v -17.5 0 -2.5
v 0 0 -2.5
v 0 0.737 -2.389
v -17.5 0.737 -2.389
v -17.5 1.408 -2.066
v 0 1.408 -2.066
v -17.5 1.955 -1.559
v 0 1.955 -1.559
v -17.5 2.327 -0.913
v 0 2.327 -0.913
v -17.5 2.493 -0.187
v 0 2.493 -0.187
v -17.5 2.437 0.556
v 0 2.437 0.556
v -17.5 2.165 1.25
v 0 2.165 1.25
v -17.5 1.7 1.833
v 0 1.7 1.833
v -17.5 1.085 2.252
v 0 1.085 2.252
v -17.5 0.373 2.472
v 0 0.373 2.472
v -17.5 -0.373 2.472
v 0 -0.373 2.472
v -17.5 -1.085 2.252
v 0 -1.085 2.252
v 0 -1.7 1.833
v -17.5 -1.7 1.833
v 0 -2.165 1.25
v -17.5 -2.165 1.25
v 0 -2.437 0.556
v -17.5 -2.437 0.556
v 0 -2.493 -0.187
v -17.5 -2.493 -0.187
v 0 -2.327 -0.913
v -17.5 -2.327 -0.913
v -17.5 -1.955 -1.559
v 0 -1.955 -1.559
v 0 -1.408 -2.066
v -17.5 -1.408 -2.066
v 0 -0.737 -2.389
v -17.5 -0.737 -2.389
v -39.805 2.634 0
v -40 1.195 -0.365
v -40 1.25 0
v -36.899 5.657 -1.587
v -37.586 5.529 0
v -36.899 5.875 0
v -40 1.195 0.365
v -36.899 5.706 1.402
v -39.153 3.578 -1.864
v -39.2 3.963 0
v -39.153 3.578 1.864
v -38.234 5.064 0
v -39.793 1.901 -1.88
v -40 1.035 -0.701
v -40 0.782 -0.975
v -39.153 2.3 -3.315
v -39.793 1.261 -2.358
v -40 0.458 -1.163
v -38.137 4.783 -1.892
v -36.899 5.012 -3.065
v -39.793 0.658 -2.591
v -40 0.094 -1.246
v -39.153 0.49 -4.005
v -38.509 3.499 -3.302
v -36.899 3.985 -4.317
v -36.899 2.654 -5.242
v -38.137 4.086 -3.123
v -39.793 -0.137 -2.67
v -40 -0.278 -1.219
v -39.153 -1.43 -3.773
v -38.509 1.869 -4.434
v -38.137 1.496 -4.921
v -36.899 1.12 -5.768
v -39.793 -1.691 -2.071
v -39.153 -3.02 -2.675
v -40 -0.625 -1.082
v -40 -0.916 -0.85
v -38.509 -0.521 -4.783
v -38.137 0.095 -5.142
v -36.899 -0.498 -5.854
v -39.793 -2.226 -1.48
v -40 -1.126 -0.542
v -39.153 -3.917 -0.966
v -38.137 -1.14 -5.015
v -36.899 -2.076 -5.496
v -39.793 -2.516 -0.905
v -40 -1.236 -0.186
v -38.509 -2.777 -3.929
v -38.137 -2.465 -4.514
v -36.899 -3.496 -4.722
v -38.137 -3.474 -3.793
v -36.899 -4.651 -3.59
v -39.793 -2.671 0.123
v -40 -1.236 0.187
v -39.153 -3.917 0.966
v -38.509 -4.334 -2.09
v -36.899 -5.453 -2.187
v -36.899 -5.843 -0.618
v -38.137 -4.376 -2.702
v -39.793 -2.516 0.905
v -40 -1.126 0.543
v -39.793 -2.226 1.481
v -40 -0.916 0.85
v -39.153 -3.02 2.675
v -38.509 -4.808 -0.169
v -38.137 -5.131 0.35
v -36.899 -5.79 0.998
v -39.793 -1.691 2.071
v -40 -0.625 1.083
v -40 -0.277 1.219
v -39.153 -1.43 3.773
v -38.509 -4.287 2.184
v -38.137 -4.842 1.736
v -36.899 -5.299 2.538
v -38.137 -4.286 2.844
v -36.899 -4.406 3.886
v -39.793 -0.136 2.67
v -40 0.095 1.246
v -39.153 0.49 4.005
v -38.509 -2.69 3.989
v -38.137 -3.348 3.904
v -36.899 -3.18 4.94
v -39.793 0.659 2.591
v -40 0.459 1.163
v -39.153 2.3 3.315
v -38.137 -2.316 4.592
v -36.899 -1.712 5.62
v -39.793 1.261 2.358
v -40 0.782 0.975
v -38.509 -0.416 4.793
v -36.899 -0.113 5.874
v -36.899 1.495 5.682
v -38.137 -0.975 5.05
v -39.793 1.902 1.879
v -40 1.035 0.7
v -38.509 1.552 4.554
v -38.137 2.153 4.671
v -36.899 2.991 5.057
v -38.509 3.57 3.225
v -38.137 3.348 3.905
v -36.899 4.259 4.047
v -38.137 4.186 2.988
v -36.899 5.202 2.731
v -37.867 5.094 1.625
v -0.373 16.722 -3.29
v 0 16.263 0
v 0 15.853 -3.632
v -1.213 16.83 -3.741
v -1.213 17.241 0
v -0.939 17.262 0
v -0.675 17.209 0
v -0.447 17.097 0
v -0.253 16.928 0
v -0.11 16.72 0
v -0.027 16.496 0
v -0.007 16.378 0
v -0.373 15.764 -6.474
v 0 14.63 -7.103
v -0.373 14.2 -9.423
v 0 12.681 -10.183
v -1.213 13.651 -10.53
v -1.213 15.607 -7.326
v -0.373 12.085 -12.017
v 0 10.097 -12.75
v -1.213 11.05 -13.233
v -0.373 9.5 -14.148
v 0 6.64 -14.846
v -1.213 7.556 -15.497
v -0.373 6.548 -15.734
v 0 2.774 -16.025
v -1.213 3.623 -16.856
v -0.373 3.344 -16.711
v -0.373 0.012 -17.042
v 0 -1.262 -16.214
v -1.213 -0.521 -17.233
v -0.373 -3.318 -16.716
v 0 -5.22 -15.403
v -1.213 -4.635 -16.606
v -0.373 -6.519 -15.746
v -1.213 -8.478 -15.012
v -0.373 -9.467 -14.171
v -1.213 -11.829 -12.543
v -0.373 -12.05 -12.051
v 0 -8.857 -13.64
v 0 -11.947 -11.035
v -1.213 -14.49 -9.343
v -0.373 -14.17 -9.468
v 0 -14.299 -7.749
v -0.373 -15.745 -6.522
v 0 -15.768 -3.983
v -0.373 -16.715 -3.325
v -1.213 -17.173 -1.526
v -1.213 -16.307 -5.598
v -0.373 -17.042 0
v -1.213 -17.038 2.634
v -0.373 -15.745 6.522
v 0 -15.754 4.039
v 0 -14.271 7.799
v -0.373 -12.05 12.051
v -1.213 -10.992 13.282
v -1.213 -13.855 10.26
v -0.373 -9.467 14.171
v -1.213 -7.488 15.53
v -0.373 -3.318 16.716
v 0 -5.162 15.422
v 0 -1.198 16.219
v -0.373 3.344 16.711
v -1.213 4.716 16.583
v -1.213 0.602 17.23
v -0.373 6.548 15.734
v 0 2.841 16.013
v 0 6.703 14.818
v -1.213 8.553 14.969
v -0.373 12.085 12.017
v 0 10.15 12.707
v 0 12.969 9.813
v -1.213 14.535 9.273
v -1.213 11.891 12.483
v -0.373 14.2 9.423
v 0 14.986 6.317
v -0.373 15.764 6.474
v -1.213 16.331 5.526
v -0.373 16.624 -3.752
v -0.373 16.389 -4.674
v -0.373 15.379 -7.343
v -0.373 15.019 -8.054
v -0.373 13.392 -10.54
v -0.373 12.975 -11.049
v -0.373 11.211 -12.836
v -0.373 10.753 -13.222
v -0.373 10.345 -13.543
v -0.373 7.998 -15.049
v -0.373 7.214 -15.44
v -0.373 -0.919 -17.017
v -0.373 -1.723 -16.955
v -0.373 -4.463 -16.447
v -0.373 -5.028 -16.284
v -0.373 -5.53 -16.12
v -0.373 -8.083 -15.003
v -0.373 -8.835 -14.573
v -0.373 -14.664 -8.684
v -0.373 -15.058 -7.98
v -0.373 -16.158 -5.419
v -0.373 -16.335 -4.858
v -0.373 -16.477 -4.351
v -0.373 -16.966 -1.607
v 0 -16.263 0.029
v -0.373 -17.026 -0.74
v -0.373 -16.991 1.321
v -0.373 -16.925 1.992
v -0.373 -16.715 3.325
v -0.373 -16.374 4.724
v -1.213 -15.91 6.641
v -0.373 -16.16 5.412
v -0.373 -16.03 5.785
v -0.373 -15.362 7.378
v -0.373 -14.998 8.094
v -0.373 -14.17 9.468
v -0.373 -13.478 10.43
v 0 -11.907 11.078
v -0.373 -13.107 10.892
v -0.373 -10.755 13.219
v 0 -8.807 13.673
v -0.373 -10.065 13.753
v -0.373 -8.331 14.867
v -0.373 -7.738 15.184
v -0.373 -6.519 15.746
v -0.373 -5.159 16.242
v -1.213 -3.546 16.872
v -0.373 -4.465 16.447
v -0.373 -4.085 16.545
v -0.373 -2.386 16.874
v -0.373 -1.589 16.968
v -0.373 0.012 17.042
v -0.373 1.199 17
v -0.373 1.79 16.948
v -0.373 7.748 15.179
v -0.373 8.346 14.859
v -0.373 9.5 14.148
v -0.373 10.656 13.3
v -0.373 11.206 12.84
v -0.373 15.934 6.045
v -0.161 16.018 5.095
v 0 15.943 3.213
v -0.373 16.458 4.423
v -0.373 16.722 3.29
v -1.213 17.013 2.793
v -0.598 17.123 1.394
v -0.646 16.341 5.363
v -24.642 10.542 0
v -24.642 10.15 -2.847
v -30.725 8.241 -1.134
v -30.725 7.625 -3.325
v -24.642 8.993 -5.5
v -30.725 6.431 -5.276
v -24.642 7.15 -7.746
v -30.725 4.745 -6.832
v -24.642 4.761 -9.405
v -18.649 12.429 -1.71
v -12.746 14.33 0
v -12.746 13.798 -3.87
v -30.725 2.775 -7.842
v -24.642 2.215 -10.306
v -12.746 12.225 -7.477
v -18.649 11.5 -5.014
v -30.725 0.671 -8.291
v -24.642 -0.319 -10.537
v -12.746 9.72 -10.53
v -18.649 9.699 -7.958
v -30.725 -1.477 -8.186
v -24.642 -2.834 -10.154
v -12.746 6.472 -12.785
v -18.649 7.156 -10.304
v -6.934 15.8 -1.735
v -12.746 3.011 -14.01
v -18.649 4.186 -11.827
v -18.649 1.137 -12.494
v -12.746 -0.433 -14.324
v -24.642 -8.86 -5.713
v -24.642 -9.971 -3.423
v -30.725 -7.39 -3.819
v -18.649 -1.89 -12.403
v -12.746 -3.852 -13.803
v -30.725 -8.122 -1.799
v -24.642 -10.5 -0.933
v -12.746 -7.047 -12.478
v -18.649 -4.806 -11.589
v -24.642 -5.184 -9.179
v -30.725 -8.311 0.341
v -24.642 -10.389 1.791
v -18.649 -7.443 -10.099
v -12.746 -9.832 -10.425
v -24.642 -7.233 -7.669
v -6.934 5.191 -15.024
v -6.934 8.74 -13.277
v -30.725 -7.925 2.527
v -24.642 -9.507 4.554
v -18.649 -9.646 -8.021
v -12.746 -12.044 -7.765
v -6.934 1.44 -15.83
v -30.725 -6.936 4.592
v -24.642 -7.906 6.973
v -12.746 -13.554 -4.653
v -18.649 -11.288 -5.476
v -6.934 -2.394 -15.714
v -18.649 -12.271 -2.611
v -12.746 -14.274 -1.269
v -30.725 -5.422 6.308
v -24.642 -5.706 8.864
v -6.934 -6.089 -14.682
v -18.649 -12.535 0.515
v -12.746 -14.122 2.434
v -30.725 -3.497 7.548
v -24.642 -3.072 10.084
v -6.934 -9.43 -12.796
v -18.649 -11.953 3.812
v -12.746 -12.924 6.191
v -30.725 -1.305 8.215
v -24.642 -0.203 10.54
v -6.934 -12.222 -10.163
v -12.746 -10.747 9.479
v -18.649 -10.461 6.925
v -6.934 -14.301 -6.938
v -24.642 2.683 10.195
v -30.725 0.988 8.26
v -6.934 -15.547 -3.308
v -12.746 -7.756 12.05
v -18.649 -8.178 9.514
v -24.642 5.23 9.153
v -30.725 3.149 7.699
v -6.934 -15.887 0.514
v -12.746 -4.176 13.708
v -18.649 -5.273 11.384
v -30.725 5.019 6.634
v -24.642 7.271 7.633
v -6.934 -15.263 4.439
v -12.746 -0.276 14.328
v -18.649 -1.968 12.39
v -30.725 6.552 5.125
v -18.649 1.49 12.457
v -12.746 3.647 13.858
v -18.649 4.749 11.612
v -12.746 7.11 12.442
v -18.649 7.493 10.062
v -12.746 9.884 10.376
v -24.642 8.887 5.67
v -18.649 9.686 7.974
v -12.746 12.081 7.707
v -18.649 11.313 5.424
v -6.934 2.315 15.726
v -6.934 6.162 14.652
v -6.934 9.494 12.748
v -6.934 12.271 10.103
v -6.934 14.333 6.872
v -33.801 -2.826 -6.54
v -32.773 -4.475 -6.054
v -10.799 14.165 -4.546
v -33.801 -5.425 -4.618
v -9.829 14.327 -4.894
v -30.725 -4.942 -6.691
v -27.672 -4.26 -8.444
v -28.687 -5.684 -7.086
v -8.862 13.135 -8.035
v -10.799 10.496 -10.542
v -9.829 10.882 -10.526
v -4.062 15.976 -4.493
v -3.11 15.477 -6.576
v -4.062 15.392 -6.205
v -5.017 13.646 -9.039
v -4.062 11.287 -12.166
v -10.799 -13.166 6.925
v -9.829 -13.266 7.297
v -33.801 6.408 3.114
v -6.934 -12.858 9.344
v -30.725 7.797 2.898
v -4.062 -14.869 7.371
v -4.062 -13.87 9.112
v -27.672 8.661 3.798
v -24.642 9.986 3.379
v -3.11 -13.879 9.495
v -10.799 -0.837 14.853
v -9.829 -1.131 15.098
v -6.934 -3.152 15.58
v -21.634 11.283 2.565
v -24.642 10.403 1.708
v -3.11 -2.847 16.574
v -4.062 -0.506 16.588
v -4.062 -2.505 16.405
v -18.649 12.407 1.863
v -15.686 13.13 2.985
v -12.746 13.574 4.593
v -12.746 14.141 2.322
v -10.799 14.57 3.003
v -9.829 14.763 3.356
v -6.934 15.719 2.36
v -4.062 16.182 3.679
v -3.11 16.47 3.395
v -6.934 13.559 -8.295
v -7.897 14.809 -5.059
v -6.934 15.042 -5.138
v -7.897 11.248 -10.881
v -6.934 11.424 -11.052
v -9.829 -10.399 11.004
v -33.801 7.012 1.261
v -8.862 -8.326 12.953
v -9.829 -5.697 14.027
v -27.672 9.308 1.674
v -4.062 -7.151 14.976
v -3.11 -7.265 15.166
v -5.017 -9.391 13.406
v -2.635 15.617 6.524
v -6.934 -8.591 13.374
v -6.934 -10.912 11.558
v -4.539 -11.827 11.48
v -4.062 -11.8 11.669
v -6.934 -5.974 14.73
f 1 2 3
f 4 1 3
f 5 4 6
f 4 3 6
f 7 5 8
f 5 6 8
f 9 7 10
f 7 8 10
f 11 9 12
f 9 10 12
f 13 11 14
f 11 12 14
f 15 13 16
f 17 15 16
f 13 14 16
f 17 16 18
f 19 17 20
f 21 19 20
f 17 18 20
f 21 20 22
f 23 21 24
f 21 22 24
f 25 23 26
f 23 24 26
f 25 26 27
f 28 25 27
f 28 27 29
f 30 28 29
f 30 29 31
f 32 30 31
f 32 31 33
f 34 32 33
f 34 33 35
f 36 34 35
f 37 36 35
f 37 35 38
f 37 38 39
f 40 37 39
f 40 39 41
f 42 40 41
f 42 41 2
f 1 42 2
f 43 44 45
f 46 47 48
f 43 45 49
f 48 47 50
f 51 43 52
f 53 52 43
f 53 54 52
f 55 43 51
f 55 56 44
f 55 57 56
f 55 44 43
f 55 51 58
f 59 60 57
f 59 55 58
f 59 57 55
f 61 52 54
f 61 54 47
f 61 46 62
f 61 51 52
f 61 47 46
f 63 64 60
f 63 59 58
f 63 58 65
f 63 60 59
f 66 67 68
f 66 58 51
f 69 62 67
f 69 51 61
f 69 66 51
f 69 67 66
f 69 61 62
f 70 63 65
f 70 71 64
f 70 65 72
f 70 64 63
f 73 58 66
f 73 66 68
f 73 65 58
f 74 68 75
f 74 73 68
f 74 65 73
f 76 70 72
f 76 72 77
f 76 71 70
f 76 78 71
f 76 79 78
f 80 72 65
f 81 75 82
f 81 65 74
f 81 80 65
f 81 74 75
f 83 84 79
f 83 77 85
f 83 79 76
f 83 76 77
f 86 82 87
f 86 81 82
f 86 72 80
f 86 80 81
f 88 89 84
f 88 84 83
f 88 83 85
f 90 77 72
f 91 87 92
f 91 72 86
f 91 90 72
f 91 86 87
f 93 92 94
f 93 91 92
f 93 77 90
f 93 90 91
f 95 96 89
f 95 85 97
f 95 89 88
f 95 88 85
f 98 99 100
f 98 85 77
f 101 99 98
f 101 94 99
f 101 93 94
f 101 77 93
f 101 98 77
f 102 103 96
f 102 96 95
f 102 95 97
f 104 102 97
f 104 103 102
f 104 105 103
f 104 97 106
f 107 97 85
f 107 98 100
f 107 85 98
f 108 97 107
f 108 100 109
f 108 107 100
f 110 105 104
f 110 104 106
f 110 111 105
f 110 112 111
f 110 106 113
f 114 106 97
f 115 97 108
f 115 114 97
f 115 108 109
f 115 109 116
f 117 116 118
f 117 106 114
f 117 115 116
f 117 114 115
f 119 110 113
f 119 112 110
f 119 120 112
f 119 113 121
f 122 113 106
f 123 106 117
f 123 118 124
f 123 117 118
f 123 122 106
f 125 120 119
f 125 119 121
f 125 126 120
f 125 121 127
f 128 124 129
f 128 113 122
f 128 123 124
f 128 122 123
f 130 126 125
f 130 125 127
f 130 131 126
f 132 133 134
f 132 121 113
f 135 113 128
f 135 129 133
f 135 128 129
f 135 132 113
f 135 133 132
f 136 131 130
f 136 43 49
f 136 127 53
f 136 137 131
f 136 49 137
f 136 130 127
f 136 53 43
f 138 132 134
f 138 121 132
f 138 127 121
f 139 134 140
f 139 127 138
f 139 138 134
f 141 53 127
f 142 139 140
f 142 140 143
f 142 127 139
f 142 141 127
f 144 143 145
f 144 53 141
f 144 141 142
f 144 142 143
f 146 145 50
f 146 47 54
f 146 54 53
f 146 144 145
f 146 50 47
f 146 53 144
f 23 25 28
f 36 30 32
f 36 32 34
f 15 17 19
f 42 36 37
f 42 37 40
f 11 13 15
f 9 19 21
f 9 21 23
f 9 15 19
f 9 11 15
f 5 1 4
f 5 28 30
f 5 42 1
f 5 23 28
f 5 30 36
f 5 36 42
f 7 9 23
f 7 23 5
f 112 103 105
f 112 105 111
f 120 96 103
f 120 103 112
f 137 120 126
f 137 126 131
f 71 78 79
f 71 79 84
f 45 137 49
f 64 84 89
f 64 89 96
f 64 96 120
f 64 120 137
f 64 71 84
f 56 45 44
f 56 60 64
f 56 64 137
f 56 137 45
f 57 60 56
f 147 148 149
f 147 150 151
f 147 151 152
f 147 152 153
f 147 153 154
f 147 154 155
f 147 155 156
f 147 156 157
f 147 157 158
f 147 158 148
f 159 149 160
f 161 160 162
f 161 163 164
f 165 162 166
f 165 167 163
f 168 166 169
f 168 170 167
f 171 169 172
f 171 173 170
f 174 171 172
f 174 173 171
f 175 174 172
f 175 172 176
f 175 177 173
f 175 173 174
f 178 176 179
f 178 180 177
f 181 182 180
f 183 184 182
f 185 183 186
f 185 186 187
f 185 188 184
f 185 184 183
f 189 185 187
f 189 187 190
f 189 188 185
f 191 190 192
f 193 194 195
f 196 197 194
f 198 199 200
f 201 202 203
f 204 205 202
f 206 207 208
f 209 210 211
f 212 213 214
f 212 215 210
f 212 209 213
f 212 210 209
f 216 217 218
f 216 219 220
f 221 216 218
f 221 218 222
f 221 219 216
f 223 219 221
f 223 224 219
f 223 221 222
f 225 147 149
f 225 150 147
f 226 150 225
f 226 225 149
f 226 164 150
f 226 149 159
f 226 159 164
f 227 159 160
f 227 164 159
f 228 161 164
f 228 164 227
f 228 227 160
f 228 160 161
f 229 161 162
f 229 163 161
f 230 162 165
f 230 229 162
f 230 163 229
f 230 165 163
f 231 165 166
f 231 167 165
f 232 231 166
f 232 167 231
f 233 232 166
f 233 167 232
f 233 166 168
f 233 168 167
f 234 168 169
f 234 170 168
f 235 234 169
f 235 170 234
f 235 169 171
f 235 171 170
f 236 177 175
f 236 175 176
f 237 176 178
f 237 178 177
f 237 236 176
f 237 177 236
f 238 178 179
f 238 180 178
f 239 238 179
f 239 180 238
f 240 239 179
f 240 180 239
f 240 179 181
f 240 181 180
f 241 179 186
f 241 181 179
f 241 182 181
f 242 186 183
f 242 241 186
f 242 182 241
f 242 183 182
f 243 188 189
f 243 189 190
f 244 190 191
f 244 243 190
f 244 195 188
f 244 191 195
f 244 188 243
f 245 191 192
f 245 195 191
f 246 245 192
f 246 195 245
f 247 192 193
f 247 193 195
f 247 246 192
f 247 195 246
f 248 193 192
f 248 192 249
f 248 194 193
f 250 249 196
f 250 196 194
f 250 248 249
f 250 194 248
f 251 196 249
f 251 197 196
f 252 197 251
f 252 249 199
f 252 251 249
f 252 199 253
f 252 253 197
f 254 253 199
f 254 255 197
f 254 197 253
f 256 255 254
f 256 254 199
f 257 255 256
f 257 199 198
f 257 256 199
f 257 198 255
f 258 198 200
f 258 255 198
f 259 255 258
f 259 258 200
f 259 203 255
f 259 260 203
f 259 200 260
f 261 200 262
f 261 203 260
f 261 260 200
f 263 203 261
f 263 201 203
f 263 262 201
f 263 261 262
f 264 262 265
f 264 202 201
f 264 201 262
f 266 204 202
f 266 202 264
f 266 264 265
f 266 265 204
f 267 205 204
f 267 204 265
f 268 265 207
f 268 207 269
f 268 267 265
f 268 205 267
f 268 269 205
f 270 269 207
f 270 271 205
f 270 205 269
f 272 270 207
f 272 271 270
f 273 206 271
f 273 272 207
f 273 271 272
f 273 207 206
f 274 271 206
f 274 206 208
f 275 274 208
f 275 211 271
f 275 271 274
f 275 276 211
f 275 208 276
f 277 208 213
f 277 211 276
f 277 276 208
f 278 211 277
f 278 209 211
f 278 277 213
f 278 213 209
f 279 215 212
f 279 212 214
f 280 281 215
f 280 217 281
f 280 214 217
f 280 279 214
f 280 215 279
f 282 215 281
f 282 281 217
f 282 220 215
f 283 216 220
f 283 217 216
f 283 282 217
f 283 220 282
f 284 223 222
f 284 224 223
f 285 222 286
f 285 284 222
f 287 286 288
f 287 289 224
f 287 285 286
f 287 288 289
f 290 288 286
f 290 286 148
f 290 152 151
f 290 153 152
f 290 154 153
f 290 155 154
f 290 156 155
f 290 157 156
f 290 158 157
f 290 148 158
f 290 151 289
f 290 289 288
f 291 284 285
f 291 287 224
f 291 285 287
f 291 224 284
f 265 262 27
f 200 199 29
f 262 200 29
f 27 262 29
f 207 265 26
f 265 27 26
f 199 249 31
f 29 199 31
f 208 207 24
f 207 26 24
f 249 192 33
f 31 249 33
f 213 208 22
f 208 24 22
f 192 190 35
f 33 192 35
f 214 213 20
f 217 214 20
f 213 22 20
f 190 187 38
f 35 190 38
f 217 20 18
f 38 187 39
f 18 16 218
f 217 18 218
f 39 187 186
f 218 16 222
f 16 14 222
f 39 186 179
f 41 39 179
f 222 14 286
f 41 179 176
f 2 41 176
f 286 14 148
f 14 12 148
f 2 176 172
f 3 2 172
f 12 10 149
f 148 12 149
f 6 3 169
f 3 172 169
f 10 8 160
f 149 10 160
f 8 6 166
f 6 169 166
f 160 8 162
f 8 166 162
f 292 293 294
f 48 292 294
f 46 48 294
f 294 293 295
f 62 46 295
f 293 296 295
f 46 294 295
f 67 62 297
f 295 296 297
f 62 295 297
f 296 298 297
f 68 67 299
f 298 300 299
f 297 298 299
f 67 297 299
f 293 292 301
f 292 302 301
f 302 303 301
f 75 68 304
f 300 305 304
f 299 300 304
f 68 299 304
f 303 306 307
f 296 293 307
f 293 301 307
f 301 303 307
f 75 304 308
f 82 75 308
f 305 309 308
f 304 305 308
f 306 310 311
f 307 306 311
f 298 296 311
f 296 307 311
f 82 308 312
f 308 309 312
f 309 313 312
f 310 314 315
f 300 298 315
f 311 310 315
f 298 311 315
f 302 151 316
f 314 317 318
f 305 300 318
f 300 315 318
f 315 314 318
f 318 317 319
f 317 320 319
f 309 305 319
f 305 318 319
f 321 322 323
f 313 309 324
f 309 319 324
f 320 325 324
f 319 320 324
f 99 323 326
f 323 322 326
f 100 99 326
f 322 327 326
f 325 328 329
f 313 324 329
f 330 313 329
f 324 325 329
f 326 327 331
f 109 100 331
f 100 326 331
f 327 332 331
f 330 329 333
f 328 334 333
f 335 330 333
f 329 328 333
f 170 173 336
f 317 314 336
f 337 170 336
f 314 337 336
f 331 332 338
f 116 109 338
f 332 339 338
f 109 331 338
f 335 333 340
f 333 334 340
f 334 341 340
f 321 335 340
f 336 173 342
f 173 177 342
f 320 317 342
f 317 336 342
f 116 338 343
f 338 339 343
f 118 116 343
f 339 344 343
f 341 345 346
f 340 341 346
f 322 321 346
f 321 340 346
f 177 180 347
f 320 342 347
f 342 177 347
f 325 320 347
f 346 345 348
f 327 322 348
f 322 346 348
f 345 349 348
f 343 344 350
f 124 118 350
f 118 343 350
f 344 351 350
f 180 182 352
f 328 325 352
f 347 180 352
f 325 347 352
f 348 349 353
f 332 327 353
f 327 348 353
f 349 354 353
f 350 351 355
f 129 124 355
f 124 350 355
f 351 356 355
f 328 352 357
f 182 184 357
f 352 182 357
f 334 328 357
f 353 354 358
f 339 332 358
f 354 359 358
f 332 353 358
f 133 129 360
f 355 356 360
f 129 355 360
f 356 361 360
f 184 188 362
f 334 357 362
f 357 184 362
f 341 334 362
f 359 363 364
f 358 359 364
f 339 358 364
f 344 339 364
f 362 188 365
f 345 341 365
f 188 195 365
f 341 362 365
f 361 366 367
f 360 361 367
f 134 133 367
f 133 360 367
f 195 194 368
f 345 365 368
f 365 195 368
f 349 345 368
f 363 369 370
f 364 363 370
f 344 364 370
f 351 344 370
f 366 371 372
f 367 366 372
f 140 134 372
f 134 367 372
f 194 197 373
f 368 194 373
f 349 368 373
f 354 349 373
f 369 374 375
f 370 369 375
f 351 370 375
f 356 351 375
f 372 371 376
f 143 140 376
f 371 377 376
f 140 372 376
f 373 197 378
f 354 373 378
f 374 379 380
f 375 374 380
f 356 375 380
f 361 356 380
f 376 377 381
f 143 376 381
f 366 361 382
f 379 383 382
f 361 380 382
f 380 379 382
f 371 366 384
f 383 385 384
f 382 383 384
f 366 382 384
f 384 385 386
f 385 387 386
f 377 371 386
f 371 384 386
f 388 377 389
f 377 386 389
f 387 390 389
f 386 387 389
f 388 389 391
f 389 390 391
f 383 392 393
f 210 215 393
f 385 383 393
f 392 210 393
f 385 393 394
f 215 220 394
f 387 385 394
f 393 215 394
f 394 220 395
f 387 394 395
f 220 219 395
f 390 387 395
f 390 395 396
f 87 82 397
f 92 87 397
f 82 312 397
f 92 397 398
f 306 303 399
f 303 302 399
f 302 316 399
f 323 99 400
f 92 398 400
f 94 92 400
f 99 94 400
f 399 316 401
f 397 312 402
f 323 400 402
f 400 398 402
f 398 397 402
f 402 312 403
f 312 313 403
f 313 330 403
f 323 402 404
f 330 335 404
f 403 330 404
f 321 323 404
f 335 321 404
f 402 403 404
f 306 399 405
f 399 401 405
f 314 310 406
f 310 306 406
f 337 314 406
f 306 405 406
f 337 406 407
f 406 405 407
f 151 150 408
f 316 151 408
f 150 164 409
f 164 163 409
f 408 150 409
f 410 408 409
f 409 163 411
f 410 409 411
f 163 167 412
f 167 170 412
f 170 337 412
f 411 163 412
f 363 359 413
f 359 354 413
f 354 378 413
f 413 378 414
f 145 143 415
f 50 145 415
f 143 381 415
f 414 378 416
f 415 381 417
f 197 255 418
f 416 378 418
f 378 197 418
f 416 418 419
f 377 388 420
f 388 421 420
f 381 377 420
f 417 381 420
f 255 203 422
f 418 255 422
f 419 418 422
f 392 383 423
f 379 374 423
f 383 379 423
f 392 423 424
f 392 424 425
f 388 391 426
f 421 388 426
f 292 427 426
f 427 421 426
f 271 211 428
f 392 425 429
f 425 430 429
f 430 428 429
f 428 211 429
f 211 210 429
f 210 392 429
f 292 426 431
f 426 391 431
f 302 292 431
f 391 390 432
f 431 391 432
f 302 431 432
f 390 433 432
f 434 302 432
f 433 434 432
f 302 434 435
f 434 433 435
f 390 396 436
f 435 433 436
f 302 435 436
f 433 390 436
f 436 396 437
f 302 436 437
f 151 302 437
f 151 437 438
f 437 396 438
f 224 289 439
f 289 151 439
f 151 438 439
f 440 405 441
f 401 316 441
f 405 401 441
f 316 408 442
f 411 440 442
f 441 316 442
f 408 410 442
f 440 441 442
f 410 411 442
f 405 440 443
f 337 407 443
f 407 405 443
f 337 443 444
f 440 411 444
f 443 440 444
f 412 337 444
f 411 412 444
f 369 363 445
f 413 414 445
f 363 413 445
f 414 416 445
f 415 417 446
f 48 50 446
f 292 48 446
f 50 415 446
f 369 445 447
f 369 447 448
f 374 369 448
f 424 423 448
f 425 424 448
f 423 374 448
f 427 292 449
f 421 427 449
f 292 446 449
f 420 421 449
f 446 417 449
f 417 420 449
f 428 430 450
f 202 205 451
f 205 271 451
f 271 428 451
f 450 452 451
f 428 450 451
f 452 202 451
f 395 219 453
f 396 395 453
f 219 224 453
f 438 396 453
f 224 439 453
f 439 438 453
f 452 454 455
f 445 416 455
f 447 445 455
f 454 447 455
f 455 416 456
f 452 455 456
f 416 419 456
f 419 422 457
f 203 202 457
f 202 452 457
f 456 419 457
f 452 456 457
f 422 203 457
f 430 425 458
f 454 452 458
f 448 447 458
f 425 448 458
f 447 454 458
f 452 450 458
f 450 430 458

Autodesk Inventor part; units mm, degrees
ref_plane "YZ Plane" through (0, 0, 0) normal (1, 0, 0) x (0, 1, 0)
ref_plane "XZ Plane" through (0, 0, 0) normal (0, 1, 0) x (-1, 0, 0)
ref_plane "XY Plane" through (0, 0, 0) normal (0, 0, 1) x (1, 0, 0)
sketch "Skizze1" plane through (0, 0, 0) normal (0, 0, 1) x (1, 0, 0)
  line L0 (0, 0) -> (-40, 0)
  line L1 (-18.9823, 13.5113) -> (0, 17.5) construction
  spline S0 degree 2 poles (-40, 4.5799) (-18.9823, 13.5113) (0, 17.5) knots 1.032137 1.032137 1.032137 2 2 2
  line L2 (0, 17.5) -> (0, 0)
  line L3 (-40, 0) -> (-40, 4.5799)
  line L4 (-40, 4.5799) -> (-18.9823, 13.5113) construction
  dimension "d1" = 17.5
  dimension "d2" = 40
revolve "Umdrehung1" add sketch "Skizze1" angle 360 about axis through (0, 0, 0) along (-1, 0, 0)
fillet "Rundung1" radius 5 1 edges at (-40, -4.5799, 0)
sketch "Skizze2" plane through (0, 0, 0) normal (1, 0, 0) x (0, 0, -1)
  circle A0 centre (0, 0) radius 2.5
  dimension "d4" = 5
extrude "Extrusion1" cut sketch "Skizze2" against normal blind 17.5
fillet "Rundung2" radius 1 1 edges at (0, -17.5, 0)
properties part number "P_MotorNose" material "ABS-Kunststoff"
